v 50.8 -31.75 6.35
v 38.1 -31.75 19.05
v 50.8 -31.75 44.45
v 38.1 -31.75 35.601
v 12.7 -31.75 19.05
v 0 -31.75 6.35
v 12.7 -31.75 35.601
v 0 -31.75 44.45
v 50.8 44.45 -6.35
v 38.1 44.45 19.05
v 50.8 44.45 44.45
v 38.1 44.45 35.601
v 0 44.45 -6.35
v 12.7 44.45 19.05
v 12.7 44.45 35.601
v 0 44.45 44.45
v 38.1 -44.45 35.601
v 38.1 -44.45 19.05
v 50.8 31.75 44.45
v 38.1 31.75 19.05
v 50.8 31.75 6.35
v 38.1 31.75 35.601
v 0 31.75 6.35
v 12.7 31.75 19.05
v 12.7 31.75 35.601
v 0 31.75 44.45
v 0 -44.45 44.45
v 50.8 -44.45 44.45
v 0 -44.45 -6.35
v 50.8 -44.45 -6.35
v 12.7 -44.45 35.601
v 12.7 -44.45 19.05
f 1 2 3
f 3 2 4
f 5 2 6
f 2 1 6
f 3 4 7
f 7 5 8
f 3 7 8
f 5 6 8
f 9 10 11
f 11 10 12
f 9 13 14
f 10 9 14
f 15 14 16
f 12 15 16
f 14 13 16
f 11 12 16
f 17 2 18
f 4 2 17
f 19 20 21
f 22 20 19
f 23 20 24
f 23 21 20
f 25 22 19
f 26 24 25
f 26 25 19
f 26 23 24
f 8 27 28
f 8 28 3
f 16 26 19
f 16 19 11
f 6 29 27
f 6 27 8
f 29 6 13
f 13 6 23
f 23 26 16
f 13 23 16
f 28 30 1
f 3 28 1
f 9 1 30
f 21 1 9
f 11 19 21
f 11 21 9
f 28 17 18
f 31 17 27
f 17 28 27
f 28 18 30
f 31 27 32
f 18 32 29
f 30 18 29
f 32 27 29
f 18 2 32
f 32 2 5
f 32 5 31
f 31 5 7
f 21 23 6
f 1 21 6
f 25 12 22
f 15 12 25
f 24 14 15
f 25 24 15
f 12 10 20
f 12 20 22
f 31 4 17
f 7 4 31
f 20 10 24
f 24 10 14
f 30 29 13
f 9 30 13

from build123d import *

# Parameters (mm, degrees)
F0_W     = 12.7
F0_H     = 12.7
F0_W_2   = 63.5
F0_H_2   = 38.1
F1_DEPTH = 50.8
F2_W     = 25.4
F2_H     = 16.551355
F3_DEPTH = 88.9


with BuildPart() as f1:
    # F0 (on Right) → F1 (new body)
    with BuildSketch(Plane.YZ):
        with Locations((38.1, 0)):
            Rectangle(F0_W, F0_H)
        Rectangle(F0_W_2, F0_H)
        with Locations((38.1, 25.4)):
            Rectangle(F0_W, F0_H_2)
        with Locations((-38.1, 0)):
            Rectangle(F0_W, F0_H)
        with Locations((-38.1, 25.4)):
            Rectangle(F0_W, F0_H_2)
    extrude(amount=F1_DEPTH)

    # F2 (on face) → F3 (cut)
    with BuildSketch(Plane(origin=(0, 44.45, 0), x_dir=(-1, 0, 0), z_dir=(0, 1, 0))):
        with Locations((-25.4, 27.325677)):
            Rectangle(F2_W, F2_H)
    extrude(amount=-F3_DEPTH, mode=Mode.SUBTRACT)


solid = f1.part
